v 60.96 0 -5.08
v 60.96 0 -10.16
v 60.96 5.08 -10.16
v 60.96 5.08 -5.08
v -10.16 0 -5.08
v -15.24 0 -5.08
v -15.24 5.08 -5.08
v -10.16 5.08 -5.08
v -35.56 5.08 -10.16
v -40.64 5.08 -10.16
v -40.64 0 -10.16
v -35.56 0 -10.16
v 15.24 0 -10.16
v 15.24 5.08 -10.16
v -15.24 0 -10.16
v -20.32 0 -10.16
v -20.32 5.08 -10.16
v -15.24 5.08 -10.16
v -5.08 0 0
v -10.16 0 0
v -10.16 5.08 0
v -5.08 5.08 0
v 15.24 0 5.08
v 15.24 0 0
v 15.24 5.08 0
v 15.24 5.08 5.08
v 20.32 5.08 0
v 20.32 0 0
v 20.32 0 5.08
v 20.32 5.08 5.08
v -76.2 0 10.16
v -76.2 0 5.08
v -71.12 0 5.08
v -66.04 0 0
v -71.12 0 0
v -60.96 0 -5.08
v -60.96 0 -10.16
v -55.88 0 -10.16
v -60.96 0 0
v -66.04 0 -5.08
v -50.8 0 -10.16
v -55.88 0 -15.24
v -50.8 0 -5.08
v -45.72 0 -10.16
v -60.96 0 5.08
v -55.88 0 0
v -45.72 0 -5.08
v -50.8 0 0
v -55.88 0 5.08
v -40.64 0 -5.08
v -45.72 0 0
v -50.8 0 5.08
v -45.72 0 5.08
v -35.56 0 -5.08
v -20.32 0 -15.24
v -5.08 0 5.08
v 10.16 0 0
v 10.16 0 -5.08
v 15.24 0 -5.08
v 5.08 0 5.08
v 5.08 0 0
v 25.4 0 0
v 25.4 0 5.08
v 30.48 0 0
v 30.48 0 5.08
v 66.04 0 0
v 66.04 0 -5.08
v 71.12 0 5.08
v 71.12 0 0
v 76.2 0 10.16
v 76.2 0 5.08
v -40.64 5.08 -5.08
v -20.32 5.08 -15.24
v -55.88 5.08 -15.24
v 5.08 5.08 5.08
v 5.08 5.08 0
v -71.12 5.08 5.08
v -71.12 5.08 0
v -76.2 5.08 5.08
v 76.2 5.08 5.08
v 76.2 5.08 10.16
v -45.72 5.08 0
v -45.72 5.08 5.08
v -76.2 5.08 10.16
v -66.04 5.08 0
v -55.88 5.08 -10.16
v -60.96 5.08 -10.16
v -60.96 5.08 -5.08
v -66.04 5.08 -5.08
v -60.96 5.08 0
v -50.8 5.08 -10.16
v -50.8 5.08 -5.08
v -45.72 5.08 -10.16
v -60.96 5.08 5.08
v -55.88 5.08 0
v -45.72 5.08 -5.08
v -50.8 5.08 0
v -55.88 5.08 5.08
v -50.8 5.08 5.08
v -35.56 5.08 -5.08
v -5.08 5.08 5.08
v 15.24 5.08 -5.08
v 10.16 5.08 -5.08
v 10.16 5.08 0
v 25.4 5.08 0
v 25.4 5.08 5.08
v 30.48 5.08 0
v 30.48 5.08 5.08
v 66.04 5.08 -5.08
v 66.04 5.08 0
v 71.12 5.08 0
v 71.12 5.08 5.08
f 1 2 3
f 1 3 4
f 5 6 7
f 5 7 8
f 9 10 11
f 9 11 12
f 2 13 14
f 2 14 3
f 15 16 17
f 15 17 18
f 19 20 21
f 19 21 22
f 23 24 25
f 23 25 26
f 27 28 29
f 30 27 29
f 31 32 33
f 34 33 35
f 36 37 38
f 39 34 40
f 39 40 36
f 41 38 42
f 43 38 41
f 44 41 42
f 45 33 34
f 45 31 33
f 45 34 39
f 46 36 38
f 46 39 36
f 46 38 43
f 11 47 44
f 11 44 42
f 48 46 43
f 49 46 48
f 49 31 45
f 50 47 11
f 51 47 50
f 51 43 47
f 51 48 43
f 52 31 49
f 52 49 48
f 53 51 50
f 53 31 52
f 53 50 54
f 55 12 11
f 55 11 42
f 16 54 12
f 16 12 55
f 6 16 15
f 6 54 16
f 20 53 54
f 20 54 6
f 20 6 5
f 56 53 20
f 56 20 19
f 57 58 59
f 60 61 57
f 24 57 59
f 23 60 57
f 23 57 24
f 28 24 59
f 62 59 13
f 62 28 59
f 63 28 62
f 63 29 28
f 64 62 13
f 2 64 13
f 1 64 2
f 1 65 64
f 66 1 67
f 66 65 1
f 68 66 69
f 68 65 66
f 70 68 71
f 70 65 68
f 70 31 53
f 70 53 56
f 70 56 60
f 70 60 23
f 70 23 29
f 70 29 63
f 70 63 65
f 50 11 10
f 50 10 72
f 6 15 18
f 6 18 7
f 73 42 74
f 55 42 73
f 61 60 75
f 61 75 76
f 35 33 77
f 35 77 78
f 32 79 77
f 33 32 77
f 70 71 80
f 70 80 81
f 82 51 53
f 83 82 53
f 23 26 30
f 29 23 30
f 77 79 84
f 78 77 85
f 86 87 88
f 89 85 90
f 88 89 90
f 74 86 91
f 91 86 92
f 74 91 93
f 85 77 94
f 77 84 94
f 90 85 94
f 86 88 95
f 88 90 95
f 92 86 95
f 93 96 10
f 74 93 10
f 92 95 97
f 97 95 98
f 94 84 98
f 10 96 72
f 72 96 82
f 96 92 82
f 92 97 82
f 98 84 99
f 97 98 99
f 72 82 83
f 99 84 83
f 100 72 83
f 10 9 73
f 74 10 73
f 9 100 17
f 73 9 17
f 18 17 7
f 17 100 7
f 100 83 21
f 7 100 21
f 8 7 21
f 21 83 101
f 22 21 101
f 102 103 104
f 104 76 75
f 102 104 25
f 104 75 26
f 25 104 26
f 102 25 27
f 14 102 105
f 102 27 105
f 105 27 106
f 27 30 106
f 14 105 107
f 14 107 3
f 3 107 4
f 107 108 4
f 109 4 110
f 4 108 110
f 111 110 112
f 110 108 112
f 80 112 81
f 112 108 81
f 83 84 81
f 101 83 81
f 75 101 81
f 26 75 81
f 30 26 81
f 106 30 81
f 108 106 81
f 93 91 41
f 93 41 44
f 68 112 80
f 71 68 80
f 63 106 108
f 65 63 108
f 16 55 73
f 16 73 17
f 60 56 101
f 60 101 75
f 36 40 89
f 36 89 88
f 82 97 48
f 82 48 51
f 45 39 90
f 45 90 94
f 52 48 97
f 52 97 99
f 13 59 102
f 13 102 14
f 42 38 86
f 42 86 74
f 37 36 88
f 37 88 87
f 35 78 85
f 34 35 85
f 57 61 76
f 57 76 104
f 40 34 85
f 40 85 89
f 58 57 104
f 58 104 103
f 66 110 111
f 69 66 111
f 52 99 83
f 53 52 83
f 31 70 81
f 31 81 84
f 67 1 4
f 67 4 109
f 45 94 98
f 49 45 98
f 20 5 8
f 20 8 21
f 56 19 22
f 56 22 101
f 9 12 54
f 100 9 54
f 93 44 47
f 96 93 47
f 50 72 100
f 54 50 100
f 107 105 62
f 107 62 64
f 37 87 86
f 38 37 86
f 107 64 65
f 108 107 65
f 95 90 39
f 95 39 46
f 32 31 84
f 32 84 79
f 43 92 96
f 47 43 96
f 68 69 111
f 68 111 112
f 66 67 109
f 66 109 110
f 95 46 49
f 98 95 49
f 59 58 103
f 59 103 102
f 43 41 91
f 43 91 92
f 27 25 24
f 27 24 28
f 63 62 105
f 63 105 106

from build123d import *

# Parameters (mm, degrees)
F0_W     = 5.08
F0_H     = 5.08
F1_DEPTH = 5.08


# Not quite as in the source:
# - a feature names something its author has since deleted; it is built from what else it names


with BuildPart() as f1:
    # F0 (on Front) → F1 (new body)
    with BuildSketch(Plane.XZ):
        Polygon((0, 5.08), (0, 10.16), (-76.2, 10.16), (-76.2, 5.08), (-71.12, 5.08), (-71.12, 0), (-66.04, 0), (-66.04, -5.08), (-60.96, -5.08), (-60.96, -10.16), (-55.88, -10.16), (-55.88, -15.24), (-20.32, -15.24), (-20.32, -10.16), (-15.24, -10.16), (-15.24, -5.08), (-10.16, -5.08), (-10.16, 0), (-5.08, 0), (-5.08, 5.08), align=None)
        with Locations((-48.26, -7.62)):
            Rectangle(F0_W, F0_H, mode=Mode.SUBTRACT)
        with Locations((-38.1, -7.62)):
            Rectangle(F0_W, F0_H, mode=Mode.SUBTRACT)
        with Locations((-58.42, 2.54)):
            Rectangle(F0_W, F0_H, mode=Mode.SUBTRACT)
        with Locations((-48.26, 2.54)):
            Rectangle(F0_W, F0_H, mode=Mode.SUBTRACT)
        Polygon((76.2, 10.16), (0, 10.16), (0, 5.08), (5.08, 5.08), (5.08, 0), (10.16, 0), (10.16, -5.08), (15.24, -5.08), (15.24, -10.16), (20.32, -10.16), (55.88, -10.16), (60.96, -10.16), (60.96, -5.08), (66.04, -5.08), (66.04, 0), (71.12, 0), (71.12, 5.08), (76.2, 5.08), align=None)
        with Locations((17.78, 2.54)):
            Rectangle(F0_W, F0_H, mode=Mode.SUBTRACT)
        with Locations((27.94, 2.54)):
            Rectangle(F0_W, F0_H, mode=Mode.SUBTRACT)
    extrude(amount=-F1_DEPTH)


solid = f1.part
